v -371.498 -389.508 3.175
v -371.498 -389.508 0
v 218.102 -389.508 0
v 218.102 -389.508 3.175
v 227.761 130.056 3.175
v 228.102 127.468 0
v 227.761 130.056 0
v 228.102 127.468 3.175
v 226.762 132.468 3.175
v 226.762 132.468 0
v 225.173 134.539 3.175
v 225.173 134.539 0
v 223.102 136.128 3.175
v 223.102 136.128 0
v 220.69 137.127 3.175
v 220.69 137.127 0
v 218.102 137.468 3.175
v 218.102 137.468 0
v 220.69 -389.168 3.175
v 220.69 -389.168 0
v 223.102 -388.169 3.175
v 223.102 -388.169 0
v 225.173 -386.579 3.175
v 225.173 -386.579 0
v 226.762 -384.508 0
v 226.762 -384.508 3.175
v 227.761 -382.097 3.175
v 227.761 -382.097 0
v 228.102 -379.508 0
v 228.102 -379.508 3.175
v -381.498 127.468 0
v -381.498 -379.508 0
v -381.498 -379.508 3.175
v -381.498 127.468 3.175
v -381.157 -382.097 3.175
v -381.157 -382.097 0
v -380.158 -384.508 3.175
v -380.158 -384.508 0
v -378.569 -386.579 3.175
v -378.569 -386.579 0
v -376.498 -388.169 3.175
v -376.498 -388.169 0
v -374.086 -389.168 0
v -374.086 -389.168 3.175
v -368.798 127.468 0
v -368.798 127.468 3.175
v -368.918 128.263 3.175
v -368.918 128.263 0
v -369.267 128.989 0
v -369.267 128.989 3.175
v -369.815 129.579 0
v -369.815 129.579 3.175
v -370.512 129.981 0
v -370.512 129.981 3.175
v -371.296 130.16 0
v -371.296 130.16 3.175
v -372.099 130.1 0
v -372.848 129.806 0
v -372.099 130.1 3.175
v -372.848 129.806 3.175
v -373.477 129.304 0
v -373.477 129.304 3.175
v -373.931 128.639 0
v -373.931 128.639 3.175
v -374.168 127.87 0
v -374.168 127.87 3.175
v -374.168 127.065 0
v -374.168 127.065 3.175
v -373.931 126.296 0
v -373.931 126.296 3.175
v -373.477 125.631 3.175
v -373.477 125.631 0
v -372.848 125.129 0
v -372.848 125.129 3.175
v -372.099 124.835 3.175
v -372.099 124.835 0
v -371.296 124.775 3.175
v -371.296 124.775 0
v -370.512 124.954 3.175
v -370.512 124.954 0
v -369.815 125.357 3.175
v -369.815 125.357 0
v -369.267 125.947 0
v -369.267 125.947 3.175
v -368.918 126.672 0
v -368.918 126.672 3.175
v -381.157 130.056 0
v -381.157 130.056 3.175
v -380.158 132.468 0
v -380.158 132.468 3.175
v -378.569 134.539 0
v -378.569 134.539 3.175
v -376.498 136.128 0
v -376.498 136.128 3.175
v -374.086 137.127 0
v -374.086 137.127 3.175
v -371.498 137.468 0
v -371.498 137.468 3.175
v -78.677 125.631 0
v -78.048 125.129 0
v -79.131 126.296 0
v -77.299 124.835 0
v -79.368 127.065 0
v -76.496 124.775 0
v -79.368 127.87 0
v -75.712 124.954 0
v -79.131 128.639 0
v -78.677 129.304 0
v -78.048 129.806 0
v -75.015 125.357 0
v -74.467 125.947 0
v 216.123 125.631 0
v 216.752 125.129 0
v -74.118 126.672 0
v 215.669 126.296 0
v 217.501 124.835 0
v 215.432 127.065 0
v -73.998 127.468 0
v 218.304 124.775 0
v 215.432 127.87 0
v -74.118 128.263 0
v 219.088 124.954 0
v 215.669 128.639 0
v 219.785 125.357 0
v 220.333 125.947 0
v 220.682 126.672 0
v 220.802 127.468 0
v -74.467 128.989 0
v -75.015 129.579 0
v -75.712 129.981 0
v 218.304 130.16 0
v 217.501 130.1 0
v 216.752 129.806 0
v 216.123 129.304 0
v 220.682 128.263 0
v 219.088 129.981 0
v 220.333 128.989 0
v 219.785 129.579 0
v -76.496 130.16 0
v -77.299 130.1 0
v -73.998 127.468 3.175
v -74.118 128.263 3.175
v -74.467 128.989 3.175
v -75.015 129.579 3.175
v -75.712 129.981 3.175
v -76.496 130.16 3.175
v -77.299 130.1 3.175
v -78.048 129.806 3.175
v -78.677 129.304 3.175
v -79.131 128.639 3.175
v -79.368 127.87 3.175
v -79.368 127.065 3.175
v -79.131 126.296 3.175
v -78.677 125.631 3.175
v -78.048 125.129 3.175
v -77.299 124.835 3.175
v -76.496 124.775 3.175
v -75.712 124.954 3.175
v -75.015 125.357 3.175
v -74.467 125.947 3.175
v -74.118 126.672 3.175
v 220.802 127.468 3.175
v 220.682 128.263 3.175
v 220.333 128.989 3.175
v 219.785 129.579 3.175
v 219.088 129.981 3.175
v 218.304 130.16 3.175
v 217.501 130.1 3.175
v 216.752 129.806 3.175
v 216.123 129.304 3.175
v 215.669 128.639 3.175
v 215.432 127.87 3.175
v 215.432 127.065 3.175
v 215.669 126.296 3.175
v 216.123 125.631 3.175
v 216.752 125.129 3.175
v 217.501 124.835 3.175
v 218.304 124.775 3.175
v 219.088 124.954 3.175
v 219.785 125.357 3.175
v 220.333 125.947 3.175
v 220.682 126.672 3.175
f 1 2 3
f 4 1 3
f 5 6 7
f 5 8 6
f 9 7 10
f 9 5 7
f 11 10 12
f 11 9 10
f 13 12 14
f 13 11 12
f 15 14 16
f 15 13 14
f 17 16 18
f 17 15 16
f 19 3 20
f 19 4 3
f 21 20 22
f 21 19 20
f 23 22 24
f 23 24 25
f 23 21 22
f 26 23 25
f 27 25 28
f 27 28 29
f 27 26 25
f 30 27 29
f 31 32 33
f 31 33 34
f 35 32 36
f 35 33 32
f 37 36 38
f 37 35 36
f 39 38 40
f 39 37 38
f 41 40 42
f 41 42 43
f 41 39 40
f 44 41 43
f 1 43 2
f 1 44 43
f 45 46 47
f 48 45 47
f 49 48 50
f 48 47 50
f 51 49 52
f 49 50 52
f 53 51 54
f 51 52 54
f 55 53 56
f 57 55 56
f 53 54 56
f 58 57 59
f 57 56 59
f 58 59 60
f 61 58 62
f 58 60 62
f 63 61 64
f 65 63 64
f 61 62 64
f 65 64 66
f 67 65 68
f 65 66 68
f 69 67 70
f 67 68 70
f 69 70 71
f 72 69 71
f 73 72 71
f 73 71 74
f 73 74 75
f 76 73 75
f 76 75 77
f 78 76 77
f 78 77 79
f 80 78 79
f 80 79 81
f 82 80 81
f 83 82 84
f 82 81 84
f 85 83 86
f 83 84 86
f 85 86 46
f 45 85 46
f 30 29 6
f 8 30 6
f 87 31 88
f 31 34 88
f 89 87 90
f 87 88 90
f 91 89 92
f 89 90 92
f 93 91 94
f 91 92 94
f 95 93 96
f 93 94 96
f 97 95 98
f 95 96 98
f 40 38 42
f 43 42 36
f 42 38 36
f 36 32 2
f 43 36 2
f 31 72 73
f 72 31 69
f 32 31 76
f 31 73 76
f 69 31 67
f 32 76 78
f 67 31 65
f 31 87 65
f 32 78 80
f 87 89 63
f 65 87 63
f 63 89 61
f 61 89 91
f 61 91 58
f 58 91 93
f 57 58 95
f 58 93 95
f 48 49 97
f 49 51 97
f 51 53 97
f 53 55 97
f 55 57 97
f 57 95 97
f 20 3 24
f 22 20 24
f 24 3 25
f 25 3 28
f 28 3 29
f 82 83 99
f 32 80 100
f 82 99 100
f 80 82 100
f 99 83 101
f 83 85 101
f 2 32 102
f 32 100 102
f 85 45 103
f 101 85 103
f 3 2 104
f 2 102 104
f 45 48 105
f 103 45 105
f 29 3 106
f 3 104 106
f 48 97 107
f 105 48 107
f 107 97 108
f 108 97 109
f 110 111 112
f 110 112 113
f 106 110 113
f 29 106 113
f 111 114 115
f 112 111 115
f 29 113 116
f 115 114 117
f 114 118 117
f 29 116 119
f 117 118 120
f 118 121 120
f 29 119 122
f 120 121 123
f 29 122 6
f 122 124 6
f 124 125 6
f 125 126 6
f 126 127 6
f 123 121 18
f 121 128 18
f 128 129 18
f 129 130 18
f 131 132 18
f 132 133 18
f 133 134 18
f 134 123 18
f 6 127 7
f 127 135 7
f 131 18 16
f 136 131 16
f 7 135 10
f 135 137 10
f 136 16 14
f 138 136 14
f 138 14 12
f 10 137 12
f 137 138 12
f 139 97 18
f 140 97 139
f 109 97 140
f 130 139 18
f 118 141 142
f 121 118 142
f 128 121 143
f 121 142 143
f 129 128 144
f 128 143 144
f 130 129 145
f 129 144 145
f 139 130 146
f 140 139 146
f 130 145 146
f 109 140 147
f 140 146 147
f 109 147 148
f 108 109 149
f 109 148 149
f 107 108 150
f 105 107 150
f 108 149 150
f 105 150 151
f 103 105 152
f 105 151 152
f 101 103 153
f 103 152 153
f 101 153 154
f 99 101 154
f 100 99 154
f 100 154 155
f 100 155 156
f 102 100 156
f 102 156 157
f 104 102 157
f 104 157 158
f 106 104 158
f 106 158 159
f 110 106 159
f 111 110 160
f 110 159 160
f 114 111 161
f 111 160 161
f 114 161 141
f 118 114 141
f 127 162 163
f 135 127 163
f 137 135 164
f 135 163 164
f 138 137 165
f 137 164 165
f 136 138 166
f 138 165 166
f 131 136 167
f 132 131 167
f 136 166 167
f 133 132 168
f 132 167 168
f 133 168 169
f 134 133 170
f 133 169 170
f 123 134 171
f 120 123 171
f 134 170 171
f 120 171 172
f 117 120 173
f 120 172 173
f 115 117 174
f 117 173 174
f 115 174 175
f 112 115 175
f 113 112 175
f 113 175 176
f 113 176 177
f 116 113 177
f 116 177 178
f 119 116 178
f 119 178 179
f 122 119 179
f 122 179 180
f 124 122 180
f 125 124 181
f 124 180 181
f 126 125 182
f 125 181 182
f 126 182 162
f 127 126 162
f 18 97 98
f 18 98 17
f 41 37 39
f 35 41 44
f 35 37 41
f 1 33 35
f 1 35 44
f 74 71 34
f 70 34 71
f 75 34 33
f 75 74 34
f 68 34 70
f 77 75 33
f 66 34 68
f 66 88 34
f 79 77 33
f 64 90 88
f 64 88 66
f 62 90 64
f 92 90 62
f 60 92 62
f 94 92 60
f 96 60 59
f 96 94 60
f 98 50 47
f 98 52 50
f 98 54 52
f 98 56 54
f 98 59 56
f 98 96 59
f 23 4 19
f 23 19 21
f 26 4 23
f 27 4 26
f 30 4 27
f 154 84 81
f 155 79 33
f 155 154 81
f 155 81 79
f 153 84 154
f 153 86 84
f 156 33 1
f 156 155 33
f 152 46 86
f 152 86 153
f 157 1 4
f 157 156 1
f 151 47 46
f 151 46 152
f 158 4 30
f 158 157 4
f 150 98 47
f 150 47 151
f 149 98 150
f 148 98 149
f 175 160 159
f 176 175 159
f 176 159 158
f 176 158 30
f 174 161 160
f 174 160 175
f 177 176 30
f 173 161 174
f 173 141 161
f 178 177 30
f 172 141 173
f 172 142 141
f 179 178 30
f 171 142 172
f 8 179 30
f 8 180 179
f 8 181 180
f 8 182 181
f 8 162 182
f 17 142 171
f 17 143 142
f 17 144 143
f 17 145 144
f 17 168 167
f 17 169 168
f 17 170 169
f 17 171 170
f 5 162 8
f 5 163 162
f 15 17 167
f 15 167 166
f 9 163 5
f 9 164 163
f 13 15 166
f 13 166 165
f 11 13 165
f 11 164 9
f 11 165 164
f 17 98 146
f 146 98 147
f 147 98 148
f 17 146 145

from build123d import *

# Parameters (mm, degrees)
SKETCH1_W           = 609.6
SKETCH1_H           = 526.976
BOSS_EXTRUDE1_DEPTH = 3.175
FILLET1_R           = 10
SKETCH2_R           = 2.7
CUT_EXTRUDE1_DEPTH  = 3.175


with BuildPart() as part:
    # Sketch1 → Boss-Extrude1 (new body)
    with BuildSketch(Plane.XY):
        with Locations((-76.698046875, -126.020421875)):
            Rectangle(SKETCH1_W, SKETCH1_H)
    extrude(amount=BOSS_EXTRUDE1_DEPTH)

    # Fillet1
    fillet1_edges = [part.edges().sort_by_distance(p)[0] for p in [
        (-381.498046875, 137.467578125, 1.5875),
        (228.101953125, 137.467578125, 1.5875),
        (228.101953125, -389.508421875, 1.5875),
        (-381.498046875, -389.508421875, 1.5875),
    ]]
    fillet(fillet1_edges, radius=FILLET1_R)

    # Sketch2 → Cut-Extrude1 (cut)
    with BuildSketch(Plane.XY.offset(3.175)):
        with Locations((-371.498046875, 127.467578125)):
            Circle(SKETCH2_R)
        with Locations((218.101953125, 127.467578125)):
            Circle(SKETCH2_R)
        with Locations((-76.698046875, 127.467578125)):
            Circle(SKETCH2_R)
        with BuildLine():
            Line((-1247.34049085, -361.808421875), (-1241.34049085, -361.808421875))
            ThreePointArc((-1241.34049085, -361.808421875), (-1239.926277288, -362.394208313), (-1239.34049085, -363.808421875))
            Line((-1239.34049085, -363.808421875), (-1239.34049085, -365.208421875))
            ThreePointArc((-1239.34049085, -365.208421875), (-1239.926277288, -366.622635437), (-1241.34049085, -367.208421875))
            Line((-1241.34049085, -367.208421875), (-1247.34049085, -367.208421875))
            ThreePointArc((-1247.34049085, -367.208421875), (-1248.754704413, -366.622635437), (-1249.34049085, -365.208421875))
            Line((-1249.34049085, -365.208421875), (-1249.34049085, -363.808421875))
            ThreePointArc((-1249.34049085, -363.808421875), (-1248.754704413, -362.394208313), (-1247.34049085, -361.808421875))
        make_face()
        with BuildLine():
            Line((-651.74049085, -367.208421875), (-657.74049085, -367.208421875))
            ThreePointArc((-657.74049085, -367.208421875), (-659.154704413, -366.622635437), (-659.74049085, -365.208421875))
            Line((-659.74049085, -365.208421875), (-659.74049085, -363.808421875))
            ThreePointArc((-659.74049085, -363.808421875), (-659.154704413, -362.394208313), (-657.74049085, -361.808421875))
            Line((-657.74049085, -361.808421875), (-651.74049085, -361.808421875))
            ThreePointArc((-651.74049085, -361.808421875), (-650.326277288, -362.394208313), (-649.74049085, -363.808421875))
            Line((-649.74049085, -363.808421875), (-649.74049085, -365.208421875))
            ThreePointArc((-649.74049085, -365.208421875), (-650.326277288, -366.622635437), (-651.74049085, -367.208421875))
        make_face()
    extrude(amount=-CUT_EXTRUDE1_DEPTH, mode=Mode.SUBTRACT)


solid = part.part
